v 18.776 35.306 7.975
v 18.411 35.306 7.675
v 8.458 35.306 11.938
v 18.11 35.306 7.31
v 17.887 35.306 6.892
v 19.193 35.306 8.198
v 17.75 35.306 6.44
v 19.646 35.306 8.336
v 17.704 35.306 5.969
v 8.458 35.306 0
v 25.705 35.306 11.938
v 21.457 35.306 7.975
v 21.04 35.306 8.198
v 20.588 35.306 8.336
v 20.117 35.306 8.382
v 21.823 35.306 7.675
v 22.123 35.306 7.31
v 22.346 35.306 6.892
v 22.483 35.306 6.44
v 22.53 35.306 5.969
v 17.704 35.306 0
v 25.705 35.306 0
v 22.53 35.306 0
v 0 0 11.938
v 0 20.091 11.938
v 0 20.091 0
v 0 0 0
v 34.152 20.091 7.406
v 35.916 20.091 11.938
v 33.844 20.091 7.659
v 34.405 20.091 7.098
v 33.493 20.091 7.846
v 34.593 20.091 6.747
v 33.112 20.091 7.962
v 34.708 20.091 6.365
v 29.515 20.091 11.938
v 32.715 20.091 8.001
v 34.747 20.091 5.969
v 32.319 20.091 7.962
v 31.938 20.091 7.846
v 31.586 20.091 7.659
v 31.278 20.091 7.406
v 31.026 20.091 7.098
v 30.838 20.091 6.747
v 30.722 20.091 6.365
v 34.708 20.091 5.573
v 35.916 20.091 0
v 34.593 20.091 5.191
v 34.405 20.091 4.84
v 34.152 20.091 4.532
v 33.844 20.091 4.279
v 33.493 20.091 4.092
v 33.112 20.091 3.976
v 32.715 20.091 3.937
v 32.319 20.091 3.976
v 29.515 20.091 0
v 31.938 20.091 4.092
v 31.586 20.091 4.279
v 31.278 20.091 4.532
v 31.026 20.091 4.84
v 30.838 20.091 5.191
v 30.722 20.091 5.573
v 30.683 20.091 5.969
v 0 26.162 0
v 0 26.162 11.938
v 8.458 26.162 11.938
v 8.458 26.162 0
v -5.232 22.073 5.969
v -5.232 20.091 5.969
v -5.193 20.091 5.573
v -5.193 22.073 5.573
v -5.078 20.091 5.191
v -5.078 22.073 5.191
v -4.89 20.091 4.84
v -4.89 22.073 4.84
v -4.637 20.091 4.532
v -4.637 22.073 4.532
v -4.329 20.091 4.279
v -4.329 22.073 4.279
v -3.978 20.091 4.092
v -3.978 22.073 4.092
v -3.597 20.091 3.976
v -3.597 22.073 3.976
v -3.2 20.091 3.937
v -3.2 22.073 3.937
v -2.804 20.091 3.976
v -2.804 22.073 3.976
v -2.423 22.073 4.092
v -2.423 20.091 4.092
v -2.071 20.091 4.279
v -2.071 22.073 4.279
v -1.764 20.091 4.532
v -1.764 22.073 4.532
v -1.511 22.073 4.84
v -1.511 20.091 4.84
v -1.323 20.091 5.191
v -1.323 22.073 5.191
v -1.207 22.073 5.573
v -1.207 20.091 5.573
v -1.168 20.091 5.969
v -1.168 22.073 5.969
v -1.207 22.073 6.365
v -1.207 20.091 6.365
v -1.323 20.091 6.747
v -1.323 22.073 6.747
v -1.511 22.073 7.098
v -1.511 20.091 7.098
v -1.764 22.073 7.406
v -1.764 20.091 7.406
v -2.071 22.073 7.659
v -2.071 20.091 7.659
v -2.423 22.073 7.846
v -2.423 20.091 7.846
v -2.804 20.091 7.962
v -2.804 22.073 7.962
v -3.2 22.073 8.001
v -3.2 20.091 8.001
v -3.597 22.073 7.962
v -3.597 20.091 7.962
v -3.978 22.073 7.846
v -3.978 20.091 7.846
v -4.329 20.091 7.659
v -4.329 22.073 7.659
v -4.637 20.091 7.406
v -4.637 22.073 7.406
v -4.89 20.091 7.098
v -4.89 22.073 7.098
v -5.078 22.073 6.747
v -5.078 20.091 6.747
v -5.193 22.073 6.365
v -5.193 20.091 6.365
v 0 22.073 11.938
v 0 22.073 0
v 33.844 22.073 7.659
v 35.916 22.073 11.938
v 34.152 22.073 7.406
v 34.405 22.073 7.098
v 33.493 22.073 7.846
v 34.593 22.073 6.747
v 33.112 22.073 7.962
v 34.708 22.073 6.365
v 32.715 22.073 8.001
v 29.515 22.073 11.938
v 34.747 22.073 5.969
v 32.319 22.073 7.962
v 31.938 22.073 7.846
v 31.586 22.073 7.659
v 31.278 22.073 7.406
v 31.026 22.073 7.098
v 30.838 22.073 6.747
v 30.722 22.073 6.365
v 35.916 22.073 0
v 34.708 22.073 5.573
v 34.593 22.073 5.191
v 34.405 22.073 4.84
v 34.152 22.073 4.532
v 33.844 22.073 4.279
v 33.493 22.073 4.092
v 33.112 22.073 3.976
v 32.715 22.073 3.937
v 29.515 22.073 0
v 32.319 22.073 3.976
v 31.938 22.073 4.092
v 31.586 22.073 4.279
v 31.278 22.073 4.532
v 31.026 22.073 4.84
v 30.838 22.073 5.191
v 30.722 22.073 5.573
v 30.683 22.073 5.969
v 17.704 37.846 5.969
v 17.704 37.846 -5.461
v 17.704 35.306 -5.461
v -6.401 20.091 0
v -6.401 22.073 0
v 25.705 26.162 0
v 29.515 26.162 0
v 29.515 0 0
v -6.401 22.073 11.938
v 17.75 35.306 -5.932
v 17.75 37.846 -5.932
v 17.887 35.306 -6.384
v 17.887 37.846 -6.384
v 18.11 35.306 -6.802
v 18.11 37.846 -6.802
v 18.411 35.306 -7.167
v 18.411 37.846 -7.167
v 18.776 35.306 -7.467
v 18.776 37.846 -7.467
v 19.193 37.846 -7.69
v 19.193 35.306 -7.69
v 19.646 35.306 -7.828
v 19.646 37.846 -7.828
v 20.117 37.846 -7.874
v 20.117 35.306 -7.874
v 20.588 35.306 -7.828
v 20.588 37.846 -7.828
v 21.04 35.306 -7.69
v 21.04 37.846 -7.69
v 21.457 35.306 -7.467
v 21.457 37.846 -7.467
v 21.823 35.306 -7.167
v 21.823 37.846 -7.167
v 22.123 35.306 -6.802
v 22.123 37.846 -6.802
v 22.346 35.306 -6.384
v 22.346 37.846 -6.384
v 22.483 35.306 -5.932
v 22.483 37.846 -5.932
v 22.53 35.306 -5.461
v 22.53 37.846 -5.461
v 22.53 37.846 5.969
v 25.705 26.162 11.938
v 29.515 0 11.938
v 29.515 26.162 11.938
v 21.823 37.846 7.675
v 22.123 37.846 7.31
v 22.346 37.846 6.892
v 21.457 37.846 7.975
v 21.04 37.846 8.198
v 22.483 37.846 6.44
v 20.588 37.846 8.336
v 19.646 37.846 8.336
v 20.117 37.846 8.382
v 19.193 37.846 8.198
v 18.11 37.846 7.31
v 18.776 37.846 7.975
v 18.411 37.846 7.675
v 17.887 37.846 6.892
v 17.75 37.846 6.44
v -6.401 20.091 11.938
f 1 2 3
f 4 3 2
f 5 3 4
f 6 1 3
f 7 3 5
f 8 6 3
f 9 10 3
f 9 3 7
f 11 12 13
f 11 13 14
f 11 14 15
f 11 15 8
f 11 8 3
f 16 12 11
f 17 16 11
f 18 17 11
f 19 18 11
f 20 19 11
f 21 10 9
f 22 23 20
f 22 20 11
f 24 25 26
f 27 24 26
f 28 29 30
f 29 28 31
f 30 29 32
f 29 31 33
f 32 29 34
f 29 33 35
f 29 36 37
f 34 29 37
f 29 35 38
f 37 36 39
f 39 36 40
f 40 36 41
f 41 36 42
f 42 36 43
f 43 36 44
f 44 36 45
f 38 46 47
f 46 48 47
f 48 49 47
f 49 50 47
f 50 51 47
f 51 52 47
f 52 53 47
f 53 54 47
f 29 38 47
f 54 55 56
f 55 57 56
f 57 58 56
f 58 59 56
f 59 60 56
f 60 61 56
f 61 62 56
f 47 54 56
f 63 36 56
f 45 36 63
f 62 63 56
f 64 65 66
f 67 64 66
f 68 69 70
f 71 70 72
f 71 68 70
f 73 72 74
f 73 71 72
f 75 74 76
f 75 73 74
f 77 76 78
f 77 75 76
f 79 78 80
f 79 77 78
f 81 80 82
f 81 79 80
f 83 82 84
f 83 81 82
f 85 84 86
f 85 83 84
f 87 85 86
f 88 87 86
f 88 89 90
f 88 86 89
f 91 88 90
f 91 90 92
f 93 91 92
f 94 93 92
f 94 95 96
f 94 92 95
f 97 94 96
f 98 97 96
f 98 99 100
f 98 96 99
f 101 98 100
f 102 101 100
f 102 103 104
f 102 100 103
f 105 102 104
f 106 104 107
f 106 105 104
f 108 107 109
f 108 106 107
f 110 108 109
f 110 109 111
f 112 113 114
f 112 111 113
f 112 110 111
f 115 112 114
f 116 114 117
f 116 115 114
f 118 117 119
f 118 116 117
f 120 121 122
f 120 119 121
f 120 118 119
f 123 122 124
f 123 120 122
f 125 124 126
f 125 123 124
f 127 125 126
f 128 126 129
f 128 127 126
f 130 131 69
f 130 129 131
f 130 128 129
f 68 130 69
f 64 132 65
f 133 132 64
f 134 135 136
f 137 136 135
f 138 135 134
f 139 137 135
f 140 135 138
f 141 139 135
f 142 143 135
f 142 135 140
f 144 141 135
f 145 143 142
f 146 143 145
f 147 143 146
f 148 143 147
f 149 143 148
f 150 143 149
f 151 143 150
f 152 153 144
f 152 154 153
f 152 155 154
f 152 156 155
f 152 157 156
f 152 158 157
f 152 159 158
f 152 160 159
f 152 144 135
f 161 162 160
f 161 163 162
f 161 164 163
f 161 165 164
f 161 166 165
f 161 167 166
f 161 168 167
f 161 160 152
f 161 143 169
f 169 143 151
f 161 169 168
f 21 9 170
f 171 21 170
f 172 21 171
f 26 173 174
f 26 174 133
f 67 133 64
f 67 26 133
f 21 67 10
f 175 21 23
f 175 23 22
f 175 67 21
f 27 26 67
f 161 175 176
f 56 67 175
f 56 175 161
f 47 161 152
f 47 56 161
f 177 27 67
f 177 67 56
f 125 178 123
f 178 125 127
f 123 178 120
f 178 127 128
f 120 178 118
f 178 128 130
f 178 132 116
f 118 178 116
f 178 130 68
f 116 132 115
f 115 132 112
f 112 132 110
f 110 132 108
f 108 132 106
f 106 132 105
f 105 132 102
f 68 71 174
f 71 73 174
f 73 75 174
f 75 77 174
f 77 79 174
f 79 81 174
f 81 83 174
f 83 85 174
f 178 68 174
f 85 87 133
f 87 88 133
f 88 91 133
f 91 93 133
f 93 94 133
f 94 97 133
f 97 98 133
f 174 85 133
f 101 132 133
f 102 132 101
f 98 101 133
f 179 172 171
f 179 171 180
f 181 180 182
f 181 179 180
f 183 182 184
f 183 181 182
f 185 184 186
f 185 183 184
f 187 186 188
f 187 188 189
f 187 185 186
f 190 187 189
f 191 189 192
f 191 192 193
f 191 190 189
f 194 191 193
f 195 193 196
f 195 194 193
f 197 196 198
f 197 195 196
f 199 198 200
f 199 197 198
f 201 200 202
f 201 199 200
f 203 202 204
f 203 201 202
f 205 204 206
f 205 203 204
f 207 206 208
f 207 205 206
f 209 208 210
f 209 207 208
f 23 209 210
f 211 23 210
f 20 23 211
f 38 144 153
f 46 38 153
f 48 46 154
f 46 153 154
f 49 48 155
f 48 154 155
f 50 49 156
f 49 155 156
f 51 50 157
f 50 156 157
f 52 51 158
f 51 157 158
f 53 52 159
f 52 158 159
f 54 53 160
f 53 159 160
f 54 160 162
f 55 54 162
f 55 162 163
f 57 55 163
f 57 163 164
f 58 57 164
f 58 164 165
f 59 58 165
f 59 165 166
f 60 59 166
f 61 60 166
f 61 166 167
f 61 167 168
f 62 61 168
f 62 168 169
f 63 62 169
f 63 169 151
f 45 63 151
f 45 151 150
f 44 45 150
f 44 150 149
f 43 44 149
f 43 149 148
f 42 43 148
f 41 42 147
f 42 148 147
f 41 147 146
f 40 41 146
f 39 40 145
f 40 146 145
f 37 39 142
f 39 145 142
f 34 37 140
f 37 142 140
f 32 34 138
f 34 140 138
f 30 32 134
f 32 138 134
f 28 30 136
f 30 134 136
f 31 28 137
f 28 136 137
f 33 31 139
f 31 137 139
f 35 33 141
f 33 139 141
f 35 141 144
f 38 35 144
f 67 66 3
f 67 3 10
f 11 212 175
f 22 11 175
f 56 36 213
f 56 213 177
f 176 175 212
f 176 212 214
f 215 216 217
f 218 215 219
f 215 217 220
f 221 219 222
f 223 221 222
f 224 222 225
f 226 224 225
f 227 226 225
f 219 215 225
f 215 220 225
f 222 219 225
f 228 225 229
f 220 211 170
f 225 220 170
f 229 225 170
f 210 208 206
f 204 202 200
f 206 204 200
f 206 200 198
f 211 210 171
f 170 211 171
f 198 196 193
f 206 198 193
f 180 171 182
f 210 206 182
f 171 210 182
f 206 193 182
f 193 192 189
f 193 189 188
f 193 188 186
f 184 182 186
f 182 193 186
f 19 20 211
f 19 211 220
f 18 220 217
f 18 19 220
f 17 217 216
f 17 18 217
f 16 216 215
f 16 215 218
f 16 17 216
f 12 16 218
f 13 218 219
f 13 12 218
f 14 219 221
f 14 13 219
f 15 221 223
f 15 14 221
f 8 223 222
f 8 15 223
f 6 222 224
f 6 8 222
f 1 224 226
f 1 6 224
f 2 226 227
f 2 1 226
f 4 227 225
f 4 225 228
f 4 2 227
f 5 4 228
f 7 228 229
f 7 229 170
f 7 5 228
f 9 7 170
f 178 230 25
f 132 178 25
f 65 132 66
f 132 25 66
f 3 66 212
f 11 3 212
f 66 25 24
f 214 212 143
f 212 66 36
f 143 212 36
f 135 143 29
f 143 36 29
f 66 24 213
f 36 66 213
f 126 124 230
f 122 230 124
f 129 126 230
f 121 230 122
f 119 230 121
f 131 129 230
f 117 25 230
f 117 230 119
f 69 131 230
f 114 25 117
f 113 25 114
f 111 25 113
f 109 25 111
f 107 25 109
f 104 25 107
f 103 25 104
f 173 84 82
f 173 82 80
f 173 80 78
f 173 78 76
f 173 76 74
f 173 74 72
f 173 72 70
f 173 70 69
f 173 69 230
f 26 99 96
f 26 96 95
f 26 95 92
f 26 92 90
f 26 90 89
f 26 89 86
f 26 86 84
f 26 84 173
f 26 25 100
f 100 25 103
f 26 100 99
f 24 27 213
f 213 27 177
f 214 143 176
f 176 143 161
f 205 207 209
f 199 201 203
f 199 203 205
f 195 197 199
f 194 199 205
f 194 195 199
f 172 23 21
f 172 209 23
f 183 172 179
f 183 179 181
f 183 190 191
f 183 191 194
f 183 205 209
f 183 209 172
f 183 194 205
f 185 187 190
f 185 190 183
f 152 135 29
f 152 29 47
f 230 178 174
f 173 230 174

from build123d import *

# Parameters (mm, degrees)
SKETCH3_W           = 29.5148
SKETCH3_H           = 11.938
BOSS_EXTRUDE1_DEPTH = 26.162
SKETCH4_W           = 11.938
SKETCH4_H           = 1.9812
BOSS_EXTRUDE2_DEPTH = 6.4008
SKETCH5_R           = 2.032
CUT_EXTRUDE1_DEPTH  = 6.4008
SKETCH6_W           = 17.2466
SKETCH6_H           = 11.938
BOSS_EXTRUDE3_DEPTH = 9.144
BOSS_EXTRUDE4_DEPTH = 2.54


with BuildPart() as part:
    # Sketch3 → Boss-Extrude1 (new body)
    with BuildSketch(Plane(origin=(0, 0, 0), x_dir=(1, 0, 0), z_dir=(0, 1, 0))):
        with Locations((14.7574, -5.969)):
            Rectangle(SKETCH3_W, SKETCH3_H)
    extrude(amount=BOSS_EXTRUDE1_DEPTH)

    # Sketch4 → Boss-Extrude2 (add)
    with BuildSketch(Plane(origin=(29.5148, 0, 0), x_dir=(0, 0, -1), z_dir=(1, 0, 0))):
        with Locations((-5.969, 21.082)):
            Rectangle(SKETCH4_W, SKETCH4_H)
    boss_extrude2 = extrude(amount=BOSS_EXTRUDE2_DEPTH)

    # Mirror1: Boss-Extrude2 across plane
    add(boss_extrude2.mirror(Plane(origin=(14.7574, 0, 0), x_dir=(0, 0, 1), z_dir=(1, 0, 0))))

    # Sketch5 → Cut-Extrude1 (cut)
    with BuildSketch(Plane(origin=(0, 22.0726, 0), x_dir=(1, 0, 0), z_dir=(0, 1, 0))):
        with Locations((32.7152, -5.969)):
            Circle(SKETCH5_R)
    cut_extrude1 = extrude(amount=-CUT_EXTRUDE1_DEPTH, mode=Mode.SUBTRACT)

    # Mirror2: Cut-Extrude1 across plane
    add(cut_extrude1.mirror(Plane(origin=(14.7574, 0, 0), x_dir=(0, 0, 1), z_dir=(1, 0, 0))), mode=Mode.SUBTRACT)

    # Sketch6 → Boss-Extrude3 (add)
    with BuildSketch(Plane(origin=(0, 26.162, 0), x_dir=(1, 0, 0), z_dir=(0, 1, 0))):
        with Locations((17.0815, -5.969)):
            Rectangle(SKETCH6_W, SKETCH6_H)
    extrude(amount=BOSS_EXTRUDE3_DEPTH)

    # Sketch7 → Boss-Extrude4 (add)
    with BuildSketch(Plane(origin=(0, 35.306, 0), x_dir=(1, 0, 0), z_dir=(0, 1, 0))):
        with BuildLine():
            Line((17.7038, -5.969), (17.7038, 5.461))
            ThreePointArc((17.7038, 5.461), (20.1168, 7.874), (22.5298, 5.461))
            Line((22.5298, 5.461), (22.5298, -5.969))
            ThreePointArc((22.5298, -5.969), (20.1168, -8.382), (17.7038, -5.969))
        make_face()
    extrude(amount=BOSS_EXTRUDE4_DEPTH)


solid = part.part
